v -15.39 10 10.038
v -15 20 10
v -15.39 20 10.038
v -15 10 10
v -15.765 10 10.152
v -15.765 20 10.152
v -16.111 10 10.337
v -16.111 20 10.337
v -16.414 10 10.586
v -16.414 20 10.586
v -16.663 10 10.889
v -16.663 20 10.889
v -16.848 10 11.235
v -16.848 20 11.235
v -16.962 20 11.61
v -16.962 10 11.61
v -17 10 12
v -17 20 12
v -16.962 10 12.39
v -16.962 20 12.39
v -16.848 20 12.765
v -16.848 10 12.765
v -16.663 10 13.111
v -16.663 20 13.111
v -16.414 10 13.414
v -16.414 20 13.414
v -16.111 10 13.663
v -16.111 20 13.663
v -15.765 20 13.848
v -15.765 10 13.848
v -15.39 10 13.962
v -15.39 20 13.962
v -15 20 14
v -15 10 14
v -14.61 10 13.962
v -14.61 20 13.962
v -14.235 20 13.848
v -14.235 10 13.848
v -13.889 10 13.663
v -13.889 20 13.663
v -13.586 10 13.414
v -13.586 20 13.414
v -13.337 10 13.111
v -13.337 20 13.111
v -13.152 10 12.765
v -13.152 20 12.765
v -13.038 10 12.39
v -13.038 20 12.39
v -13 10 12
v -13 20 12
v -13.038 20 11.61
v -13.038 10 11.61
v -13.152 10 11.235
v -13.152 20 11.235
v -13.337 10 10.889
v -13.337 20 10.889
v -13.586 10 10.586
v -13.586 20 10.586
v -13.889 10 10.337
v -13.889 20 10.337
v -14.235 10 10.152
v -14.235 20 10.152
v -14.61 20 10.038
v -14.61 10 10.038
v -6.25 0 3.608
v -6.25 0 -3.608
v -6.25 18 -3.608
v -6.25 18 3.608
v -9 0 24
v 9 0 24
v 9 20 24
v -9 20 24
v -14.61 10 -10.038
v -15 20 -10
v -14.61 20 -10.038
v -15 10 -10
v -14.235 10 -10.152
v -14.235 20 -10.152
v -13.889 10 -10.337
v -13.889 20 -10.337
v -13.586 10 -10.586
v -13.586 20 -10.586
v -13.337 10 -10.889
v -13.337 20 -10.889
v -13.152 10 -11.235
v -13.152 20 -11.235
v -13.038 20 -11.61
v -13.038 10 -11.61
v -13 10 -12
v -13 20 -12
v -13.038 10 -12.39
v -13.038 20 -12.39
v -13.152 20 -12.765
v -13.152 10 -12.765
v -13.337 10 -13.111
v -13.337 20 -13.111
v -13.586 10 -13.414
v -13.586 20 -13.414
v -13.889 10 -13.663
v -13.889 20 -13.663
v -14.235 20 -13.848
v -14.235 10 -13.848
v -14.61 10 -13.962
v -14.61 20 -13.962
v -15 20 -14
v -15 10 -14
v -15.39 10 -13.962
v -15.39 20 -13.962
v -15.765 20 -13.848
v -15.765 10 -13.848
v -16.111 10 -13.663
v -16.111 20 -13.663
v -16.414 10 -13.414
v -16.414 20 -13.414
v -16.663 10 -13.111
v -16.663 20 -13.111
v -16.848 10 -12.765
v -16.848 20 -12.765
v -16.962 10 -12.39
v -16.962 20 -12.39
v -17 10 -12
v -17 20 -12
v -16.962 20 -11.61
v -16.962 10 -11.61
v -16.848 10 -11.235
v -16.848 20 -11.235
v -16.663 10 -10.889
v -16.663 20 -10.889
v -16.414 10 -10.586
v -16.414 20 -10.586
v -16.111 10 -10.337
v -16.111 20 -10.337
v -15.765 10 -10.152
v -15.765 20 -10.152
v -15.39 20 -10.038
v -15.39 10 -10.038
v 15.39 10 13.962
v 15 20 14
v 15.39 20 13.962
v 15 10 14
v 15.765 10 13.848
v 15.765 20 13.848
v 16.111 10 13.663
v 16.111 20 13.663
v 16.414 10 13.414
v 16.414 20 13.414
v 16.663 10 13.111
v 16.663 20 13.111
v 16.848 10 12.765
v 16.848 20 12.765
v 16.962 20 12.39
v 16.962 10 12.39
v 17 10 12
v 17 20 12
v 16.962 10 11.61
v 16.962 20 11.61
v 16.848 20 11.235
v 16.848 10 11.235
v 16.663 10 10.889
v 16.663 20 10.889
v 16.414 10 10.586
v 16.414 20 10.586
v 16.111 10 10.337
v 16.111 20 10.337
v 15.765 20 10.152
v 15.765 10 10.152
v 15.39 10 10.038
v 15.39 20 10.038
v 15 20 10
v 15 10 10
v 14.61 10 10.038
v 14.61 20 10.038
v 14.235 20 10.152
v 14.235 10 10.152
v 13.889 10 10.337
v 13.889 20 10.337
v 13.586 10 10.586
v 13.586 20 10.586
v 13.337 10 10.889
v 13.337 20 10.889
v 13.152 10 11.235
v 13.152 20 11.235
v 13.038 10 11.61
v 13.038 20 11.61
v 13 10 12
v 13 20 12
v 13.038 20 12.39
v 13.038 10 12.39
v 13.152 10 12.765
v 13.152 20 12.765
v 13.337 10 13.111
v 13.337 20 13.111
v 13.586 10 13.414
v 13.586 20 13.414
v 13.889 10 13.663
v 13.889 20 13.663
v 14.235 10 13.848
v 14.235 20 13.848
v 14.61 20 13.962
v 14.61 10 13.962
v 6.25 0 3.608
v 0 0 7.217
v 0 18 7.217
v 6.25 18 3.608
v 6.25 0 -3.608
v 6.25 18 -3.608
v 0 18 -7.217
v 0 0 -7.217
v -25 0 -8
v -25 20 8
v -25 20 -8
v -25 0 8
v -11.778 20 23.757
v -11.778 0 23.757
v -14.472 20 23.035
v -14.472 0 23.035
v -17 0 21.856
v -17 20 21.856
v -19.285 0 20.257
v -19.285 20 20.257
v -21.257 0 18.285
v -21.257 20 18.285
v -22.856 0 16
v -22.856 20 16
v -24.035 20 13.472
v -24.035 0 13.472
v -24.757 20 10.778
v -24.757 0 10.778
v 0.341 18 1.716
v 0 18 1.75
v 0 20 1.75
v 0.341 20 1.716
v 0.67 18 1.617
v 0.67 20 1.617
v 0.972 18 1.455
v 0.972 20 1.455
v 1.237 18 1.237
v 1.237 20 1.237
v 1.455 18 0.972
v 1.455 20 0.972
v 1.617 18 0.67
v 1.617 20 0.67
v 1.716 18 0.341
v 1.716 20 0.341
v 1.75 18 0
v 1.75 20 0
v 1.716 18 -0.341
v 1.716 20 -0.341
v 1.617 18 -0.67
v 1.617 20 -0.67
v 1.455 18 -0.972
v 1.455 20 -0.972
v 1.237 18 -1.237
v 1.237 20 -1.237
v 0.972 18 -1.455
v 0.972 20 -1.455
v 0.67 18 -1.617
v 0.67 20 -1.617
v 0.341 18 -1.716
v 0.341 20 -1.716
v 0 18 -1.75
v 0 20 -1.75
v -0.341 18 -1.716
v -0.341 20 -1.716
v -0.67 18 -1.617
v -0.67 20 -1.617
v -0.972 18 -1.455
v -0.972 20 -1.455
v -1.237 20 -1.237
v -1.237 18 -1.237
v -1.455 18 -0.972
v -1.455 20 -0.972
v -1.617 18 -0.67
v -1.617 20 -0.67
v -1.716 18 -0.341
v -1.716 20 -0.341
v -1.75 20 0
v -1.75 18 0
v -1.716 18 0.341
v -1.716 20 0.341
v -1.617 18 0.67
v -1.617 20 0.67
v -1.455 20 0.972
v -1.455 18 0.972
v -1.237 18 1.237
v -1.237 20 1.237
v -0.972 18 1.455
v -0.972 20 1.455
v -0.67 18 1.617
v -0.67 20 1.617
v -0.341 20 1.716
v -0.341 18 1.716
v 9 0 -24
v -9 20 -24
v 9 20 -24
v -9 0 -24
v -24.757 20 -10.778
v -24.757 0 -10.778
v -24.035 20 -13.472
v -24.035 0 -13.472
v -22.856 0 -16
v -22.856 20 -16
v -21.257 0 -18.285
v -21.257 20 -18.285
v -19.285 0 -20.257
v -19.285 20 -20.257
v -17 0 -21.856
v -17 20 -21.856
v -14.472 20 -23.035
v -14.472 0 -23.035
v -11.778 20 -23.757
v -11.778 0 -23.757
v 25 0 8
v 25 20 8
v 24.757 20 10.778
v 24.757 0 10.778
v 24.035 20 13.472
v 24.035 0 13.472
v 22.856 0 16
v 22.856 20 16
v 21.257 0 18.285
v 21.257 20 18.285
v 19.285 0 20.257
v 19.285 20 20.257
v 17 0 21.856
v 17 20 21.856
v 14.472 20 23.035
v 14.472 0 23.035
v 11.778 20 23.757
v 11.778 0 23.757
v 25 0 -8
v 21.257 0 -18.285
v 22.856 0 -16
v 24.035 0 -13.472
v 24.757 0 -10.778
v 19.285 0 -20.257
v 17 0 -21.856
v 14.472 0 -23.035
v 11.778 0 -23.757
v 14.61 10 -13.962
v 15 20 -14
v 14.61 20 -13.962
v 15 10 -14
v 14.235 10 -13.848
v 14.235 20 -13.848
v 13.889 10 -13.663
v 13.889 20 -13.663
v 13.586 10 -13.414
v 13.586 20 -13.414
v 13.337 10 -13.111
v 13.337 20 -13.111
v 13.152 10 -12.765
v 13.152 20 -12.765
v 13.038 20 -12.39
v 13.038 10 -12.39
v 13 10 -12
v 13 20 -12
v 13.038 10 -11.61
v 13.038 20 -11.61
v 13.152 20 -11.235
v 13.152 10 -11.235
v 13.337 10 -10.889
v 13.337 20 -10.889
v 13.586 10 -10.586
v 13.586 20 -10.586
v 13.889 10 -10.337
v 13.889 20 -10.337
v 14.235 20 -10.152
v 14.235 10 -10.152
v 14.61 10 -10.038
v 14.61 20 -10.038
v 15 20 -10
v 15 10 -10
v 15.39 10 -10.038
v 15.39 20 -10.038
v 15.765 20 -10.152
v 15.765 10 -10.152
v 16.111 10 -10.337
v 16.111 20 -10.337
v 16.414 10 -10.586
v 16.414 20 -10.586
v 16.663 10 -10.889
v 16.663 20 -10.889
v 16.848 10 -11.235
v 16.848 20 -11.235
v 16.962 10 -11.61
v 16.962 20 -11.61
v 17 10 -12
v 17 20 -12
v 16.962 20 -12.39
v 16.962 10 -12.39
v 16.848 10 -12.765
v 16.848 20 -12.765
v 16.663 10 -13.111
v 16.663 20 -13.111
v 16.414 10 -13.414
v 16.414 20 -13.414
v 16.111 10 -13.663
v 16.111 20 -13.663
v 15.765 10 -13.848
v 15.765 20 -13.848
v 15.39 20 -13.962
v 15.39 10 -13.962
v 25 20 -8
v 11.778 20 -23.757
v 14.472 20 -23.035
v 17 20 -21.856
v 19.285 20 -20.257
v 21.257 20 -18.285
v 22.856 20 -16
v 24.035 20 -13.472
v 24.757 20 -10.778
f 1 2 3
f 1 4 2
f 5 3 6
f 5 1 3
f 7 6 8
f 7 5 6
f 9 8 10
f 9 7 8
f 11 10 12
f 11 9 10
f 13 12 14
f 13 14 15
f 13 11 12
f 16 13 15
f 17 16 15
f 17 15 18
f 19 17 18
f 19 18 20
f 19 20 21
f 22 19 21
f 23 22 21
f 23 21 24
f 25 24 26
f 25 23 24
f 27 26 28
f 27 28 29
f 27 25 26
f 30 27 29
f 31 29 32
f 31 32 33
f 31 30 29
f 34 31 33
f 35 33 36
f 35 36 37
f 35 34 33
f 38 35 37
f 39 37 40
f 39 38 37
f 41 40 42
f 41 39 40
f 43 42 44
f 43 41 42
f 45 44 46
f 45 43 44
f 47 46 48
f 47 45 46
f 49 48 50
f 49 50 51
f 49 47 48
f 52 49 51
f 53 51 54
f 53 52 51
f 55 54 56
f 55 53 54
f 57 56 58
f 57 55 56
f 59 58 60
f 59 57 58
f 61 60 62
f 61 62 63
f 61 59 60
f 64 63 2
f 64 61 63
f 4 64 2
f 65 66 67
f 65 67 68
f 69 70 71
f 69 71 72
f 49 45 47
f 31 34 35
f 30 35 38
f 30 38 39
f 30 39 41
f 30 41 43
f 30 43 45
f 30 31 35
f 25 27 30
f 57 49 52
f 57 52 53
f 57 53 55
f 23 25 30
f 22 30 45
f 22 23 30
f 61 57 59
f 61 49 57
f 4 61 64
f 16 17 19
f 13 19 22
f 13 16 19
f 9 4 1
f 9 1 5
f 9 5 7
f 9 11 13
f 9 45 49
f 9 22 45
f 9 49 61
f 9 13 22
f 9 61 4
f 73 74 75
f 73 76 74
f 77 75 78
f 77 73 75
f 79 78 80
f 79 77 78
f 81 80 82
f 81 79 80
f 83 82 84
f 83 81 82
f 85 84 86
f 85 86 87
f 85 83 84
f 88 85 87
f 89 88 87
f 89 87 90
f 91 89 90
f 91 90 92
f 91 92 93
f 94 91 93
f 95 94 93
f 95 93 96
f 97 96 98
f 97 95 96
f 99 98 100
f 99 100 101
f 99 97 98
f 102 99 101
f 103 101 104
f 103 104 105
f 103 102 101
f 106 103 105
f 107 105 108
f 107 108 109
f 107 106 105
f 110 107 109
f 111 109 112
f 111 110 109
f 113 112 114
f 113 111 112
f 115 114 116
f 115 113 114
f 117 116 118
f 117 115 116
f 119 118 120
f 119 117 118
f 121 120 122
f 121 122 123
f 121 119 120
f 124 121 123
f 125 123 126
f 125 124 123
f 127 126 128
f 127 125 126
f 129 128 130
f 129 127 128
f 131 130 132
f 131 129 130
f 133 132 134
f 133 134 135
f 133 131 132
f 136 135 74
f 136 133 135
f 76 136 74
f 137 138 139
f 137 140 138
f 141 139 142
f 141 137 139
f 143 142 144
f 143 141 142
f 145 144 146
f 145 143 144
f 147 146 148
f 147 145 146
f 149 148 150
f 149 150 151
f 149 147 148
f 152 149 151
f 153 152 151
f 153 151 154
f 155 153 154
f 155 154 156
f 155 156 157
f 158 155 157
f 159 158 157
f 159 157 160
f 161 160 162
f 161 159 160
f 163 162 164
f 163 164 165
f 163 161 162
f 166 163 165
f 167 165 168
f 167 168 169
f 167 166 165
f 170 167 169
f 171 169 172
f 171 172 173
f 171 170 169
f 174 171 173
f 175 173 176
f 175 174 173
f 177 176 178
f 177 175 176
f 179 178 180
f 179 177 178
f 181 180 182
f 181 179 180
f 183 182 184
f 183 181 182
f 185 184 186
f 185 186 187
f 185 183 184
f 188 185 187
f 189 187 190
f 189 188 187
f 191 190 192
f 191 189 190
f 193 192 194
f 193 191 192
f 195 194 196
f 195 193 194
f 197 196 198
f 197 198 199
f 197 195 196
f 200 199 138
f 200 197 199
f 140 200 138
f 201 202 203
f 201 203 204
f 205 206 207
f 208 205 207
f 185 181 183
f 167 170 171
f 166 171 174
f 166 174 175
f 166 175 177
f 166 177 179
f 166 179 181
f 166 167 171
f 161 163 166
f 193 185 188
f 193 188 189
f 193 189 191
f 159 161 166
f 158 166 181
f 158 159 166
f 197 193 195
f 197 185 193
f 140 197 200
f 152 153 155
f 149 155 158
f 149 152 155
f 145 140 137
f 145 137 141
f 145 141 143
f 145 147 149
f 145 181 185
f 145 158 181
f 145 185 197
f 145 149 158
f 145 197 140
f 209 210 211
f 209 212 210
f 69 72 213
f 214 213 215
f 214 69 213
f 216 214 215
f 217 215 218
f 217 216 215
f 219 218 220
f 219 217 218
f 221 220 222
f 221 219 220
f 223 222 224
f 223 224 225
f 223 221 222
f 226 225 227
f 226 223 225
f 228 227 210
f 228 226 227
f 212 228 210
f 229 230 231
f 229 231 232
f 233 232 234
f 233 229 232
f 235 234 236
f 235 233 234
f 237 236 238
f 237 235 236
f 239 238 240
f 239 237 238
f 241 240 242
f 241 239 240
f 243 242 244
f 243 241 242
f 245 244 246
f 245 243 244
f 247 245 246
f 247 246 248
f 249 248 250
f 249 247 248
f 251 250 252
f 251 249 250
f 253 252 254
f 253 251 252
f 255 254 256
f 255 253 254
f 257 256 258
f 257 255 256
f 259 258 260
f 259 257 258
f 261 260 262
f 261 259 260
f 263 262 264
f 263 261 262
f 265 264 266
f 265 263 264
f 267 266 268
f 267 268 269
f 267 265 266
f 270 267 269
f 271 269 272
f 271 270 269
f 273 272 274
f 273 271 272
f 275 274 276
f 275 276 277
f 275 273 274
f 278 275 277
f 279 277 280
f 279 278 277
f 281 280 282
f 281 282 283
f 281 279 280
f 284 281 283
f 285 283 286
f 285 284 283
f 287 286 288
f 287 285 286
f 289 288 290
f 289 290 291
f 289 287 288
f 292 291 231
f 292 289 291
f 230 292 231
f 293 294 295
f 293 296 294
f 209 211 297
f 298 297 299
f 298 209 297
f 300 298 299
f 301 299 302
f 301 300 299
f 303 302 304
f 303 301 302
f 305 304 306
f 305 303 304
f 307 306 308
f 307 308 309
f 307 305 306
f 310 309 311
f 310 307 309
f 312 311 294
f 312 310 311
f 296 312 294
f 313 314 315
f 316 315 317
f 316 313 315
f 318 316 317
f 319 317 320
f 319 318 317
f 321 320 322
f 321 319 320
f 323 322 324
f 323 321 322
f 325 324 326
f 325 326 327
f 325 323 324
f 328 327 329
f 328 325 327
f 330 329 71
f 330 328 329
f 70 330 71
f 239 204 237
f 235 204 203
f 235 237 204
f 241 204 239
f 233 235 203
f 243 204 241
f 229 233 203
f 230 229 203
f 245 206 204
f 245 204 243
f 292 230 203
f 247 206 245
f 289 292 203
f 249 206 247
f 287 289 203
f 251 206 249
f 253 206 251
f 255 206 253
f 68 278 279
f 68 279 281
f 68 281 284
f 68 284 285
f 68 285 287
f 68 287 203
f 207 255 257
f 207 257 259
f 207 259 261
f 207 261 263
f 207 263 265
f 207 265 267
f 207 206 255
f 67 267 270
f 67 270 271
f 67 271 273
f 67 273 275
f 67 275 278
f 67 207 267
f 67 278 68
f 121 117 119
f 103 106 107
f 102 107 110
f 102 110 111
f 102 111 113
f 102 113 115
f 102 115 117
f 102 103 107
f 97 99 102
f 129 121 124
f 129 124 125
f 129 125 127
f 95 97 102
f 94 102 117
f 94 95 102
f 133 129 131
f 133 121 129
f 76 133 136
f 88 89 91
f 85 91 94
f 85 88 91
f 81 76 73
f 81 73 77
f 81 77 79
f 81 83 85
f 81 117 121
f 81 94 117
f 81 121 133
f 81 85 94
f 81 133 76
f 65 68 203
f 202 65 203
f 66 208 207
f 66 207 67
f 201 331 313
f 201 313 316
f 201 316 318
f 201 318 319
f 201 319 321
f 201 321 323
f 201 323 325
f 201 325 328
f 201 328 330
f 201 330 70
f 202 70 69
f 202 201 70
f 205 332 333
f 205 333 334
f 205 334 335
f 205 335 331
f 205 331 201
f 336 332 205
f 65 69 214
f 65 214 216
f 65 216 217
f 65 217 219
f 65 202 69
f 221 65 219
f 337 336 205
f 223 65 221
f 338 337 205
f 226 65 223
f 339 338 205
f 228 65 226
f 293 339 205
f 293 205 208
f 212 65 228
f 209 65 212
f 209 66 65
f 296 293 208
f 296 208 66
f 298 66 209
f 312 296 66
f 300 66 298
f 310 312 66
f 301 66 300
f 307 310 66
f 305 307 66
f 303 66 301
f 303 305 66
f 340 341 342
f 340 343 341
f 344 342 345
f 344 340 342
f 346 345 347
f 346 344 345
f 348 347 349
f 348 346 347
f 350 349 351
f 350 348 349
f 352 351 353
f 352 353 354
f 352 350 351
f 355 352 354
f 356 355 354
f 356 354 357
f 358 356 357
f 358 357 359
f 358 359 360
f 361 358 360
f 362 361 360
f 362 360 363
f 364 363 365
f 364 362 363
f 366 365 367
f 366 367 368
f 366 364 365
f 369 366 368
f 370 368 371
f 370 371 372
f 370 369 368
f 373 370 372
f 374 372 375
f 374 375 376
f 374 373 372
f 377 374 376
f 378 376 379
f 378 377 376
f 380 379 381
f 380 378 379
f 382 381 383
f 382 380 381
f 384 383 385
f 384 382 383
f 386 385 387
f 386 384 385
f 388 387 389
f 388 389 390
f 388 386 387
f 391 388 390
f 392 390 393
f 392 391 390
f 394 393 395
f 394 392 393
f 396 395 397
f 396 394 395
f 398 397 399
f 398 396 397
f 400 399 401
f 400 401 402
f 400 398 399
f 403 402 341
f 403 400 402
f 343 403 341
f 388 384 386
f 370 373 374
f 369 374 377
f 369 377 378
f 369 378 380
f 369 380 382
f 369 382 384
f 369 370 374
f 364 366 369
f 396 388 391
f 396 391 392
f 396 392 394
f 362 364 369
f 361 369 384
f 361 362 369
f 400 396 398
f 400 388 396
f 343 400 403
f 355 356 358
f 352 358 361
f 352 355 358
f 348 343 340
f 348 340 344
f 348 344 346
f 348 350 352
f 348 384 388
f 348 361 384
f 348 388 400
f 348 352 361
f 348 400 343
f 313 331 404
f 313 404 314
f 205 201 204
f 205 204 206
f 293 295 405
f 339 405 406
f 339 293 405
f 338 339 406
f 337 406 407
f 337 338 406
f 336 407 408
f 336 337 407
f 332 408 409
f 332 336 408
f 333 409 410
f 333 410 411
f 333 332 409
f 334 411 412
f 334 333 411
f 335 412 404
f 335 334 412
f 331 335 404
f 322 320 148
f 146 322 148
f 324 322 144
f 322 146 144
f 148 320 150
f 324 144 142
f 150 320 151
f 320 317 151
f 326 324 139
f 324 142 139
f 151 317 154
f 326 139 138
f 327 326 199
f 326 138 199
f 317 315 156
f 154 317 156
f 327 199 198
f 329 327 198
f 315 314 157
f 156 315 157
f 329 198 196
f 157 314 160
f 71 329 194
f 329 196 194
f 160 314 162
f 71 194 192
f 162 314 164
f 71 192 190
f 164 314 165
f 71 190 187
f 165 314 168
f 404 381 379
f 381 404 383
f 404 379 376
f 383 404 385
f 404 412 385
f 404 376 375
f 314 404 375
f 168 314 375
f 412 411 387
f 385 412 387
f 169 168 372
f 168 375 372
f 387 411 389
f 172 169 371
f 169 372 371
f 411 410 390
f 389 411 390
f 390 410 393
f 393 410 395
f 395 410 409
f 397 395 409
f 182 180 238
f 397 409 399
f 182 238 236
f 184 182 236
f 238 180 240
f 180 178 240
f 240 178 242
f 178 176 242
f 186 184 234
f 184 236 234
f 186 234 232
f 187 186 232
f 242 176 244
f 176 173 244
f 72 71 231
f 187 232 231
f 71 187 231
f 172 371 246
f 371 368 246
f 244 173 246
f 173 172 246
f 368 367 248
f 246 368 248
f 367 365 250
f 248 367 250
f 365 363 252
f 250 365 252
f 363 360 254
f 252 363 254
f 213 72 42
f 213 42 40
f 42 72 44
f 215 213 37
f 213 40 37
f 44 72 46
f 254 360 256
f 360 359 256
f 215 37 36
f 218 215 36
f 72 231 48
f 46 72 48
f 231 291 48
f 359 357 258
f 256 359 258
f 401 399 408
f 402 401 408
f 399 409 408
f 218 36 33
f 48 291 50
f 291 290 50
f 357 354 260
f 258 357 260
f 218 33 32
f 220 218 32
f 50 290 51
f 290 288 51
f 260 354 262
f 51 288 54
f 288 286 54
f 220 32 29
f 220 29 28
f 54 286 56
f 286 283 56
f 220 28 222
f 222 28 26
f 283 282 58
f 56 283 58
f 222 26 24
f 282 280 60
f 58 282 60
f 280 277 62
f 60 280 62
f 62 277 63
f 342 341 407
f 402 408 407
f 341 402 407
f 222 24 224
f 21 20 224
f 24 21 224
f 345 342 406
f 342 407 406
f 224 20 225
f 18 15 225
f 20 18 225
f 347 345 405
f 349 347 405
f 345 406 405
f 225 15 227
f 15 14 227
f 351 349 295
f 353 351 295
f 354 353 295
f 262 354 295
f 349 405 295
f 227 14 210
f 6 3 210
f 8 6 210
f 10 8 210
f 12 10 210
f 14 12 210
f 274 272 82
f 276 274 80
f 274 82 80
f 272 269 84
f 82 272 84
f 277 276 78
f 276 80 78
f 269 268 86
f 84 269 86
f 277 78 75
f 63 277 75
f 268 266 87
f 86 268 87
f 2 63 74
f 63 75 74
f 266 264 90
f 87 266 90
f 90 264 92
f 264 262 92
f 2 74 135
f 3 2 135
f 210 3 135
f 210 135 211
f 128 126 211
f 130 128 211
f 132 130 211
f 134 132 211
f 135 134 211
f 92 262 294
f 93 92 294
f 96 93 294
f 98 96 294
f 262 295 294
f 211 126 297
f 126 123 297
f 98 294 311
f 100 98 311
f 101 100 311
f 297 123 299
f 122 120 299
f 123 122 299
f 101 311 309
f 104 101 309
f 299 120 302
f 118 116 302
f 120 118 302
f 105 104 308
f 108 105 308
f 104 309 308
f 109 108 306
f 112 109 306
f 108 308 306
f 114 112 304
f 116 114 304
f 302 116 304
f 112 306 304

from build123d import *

# Parameters (mm, degrees)
BOSS_EXTRUDE1_DEPTH = 18
SKETCH2_R           = 2
SKETCH2_R_2         = 1.75
BOSS_EXTRUDE3_DEPTH = 2
CUT_EXTRUDE1_START  = -10
SKETCH3_R           = 2
CUT_EXTRUDE1_DEPTH  = 10


with BuildPart() as part:
    # Sketch1 → Boss-Extrude1 (new body)
    with BuildSketch(Plane(origin=(0, 0, 0), x_dir=(1, 0, 0), z_dir=(0, 1, 0))):
        with BuildLine():
            Line((-9.000000373, 24.000000209), (9.000000373, 24.000000209))
            ThreePointArc((9.000000373, 24.000000209), (20.313708872, 19.313708708), (25.000000373, 8.000000209))
            Line((25.000000373, 8.000000209), (25.000000373, -8.000000209))
            ThreePointArc((25.000000373, -8.000000209), (20.313708872, -19.313708708), (9.000000373, -24.000000209))
            Line((9.000000373, -24.000000209), (-9.000000373, -24.000000209))
            ThreePointArc((-9.000000373, -24.000000209), (-20.313708872, -19.313708708), (-25.000000373, -8.000000209))
            Line((-25.000000373, -8.000000209), (-25.000000373, 8.000000209))
            ThreePointArc((-25.000000373, 8.000000209), (-20.313708872, 19.313708708), (-9.000000373, 24.000000209))
        make_face()
        Polygon((0, 7.216878365), (-6.25, 3.608439182), (-6.25, -3.608439182), (0, -7.216878365), (6.25, -3.608439182), (6.25, 3.608439182), align=None, mode=Mode.SUBTRACT)
    extrude(amount=BOSS_EXTRUDE1_DEPTH)

    # Sketch2 → Boss-Extrude3 (add)
    with BuildSketch(Plane(origin=(0, 18, 0), x_dir=(1, 0, 0), z_dir=(0, 1, 0))):
        with BuildLine():
            Line((-9.000000373, 24.000000209), (9.000000373, 24.000000209))
            ThreePointArc((9.000000373, 24.000000209), (20.313708872, 19.313708708), (25.000000373, 8.000000209))
            Line((25.000000373, 8.000000209), (25.000000373, -8.000000209))
            ThreePointArc((25.000000373, -8.000000209), (20.313708872, -19.313708708), (9.000000373, -24.000000209))
            Line((9.000000373, -24.000000209), (-9.000000373, -24.000000209))
            ThreePointArc((-9.000000373, -24.000000209), (-20.313708872, -19.313708708), (-25.000000373, -8.000000209))
            Line((-25.000000373, -8.000000209), (-25.000000373, 8.000000209))
            ThreePointArc((-25.000000373, 8.000000209), (-20.313708872, 19.313708708), (-9.000000373, 24.000000209))
        make_face()
        with Locations(Location((-14.999999943, 12.000001696, 0), (0, 0, 270))):
            Circle(SKETCH2_R, mode=Mode.SUBTRACT)
        with Locations(Location((14.999999943, 12.000001696, 0), (0, 0, 90))):
            Circle(SKETCH2_R, mode=Mode.SUBTRACT)
        with Locations(Location((14.999999943, -12.000001696, 0), (0, 0, 270))):
            Circle(SKETCH2_R, mode=Mode.SUBTRACT)
        with Locations(Location((-14.999999943, -12.000001696, 0), (0, 0, 90))):
            Circle(SKETCH2_R, mode=Mode.SUBTRACT)
        with Locations(Location((0, 0, 0), (0, 0, 270))):
            Circle(SKETCH2_R_2, mode=Mode.SUBTRACT)
    extrude(amount=BOSS_EXTRUDE3_DEPTH)

    # Sketch3 → Cut-Extrude1 (cut)
    with BuildSketch(Plane(origin=(0, 20, 0), x_dir=(1, 0, 0), z_dir=(0, 1, 0)).offset(CUT_EXTRUDE1_START)):
        with Locations(Location((-14.999999943, 12.000001696, 0), (0, 0, 270))):
            Circle(SKETCH3_R)
        with Locations(Location((14.999999943, 12.000001696, 0), (0, 0, 90))):
            Circle(SKETCH3_R)
        with Locations(Location((14.999999943, -12.000001696, 0), (0, 0, 270))):
            Circle(SKETCH3_R)
        with Locations(Location((-14.999999943, -12.000001696, 0), (0, 0, 90))):
            Circle(SKETCH3_R)
    extrude(amount=CUT_EXTRUDE1_DEPTH, mode=Mode.SUBTRACT)


solid = part.part
